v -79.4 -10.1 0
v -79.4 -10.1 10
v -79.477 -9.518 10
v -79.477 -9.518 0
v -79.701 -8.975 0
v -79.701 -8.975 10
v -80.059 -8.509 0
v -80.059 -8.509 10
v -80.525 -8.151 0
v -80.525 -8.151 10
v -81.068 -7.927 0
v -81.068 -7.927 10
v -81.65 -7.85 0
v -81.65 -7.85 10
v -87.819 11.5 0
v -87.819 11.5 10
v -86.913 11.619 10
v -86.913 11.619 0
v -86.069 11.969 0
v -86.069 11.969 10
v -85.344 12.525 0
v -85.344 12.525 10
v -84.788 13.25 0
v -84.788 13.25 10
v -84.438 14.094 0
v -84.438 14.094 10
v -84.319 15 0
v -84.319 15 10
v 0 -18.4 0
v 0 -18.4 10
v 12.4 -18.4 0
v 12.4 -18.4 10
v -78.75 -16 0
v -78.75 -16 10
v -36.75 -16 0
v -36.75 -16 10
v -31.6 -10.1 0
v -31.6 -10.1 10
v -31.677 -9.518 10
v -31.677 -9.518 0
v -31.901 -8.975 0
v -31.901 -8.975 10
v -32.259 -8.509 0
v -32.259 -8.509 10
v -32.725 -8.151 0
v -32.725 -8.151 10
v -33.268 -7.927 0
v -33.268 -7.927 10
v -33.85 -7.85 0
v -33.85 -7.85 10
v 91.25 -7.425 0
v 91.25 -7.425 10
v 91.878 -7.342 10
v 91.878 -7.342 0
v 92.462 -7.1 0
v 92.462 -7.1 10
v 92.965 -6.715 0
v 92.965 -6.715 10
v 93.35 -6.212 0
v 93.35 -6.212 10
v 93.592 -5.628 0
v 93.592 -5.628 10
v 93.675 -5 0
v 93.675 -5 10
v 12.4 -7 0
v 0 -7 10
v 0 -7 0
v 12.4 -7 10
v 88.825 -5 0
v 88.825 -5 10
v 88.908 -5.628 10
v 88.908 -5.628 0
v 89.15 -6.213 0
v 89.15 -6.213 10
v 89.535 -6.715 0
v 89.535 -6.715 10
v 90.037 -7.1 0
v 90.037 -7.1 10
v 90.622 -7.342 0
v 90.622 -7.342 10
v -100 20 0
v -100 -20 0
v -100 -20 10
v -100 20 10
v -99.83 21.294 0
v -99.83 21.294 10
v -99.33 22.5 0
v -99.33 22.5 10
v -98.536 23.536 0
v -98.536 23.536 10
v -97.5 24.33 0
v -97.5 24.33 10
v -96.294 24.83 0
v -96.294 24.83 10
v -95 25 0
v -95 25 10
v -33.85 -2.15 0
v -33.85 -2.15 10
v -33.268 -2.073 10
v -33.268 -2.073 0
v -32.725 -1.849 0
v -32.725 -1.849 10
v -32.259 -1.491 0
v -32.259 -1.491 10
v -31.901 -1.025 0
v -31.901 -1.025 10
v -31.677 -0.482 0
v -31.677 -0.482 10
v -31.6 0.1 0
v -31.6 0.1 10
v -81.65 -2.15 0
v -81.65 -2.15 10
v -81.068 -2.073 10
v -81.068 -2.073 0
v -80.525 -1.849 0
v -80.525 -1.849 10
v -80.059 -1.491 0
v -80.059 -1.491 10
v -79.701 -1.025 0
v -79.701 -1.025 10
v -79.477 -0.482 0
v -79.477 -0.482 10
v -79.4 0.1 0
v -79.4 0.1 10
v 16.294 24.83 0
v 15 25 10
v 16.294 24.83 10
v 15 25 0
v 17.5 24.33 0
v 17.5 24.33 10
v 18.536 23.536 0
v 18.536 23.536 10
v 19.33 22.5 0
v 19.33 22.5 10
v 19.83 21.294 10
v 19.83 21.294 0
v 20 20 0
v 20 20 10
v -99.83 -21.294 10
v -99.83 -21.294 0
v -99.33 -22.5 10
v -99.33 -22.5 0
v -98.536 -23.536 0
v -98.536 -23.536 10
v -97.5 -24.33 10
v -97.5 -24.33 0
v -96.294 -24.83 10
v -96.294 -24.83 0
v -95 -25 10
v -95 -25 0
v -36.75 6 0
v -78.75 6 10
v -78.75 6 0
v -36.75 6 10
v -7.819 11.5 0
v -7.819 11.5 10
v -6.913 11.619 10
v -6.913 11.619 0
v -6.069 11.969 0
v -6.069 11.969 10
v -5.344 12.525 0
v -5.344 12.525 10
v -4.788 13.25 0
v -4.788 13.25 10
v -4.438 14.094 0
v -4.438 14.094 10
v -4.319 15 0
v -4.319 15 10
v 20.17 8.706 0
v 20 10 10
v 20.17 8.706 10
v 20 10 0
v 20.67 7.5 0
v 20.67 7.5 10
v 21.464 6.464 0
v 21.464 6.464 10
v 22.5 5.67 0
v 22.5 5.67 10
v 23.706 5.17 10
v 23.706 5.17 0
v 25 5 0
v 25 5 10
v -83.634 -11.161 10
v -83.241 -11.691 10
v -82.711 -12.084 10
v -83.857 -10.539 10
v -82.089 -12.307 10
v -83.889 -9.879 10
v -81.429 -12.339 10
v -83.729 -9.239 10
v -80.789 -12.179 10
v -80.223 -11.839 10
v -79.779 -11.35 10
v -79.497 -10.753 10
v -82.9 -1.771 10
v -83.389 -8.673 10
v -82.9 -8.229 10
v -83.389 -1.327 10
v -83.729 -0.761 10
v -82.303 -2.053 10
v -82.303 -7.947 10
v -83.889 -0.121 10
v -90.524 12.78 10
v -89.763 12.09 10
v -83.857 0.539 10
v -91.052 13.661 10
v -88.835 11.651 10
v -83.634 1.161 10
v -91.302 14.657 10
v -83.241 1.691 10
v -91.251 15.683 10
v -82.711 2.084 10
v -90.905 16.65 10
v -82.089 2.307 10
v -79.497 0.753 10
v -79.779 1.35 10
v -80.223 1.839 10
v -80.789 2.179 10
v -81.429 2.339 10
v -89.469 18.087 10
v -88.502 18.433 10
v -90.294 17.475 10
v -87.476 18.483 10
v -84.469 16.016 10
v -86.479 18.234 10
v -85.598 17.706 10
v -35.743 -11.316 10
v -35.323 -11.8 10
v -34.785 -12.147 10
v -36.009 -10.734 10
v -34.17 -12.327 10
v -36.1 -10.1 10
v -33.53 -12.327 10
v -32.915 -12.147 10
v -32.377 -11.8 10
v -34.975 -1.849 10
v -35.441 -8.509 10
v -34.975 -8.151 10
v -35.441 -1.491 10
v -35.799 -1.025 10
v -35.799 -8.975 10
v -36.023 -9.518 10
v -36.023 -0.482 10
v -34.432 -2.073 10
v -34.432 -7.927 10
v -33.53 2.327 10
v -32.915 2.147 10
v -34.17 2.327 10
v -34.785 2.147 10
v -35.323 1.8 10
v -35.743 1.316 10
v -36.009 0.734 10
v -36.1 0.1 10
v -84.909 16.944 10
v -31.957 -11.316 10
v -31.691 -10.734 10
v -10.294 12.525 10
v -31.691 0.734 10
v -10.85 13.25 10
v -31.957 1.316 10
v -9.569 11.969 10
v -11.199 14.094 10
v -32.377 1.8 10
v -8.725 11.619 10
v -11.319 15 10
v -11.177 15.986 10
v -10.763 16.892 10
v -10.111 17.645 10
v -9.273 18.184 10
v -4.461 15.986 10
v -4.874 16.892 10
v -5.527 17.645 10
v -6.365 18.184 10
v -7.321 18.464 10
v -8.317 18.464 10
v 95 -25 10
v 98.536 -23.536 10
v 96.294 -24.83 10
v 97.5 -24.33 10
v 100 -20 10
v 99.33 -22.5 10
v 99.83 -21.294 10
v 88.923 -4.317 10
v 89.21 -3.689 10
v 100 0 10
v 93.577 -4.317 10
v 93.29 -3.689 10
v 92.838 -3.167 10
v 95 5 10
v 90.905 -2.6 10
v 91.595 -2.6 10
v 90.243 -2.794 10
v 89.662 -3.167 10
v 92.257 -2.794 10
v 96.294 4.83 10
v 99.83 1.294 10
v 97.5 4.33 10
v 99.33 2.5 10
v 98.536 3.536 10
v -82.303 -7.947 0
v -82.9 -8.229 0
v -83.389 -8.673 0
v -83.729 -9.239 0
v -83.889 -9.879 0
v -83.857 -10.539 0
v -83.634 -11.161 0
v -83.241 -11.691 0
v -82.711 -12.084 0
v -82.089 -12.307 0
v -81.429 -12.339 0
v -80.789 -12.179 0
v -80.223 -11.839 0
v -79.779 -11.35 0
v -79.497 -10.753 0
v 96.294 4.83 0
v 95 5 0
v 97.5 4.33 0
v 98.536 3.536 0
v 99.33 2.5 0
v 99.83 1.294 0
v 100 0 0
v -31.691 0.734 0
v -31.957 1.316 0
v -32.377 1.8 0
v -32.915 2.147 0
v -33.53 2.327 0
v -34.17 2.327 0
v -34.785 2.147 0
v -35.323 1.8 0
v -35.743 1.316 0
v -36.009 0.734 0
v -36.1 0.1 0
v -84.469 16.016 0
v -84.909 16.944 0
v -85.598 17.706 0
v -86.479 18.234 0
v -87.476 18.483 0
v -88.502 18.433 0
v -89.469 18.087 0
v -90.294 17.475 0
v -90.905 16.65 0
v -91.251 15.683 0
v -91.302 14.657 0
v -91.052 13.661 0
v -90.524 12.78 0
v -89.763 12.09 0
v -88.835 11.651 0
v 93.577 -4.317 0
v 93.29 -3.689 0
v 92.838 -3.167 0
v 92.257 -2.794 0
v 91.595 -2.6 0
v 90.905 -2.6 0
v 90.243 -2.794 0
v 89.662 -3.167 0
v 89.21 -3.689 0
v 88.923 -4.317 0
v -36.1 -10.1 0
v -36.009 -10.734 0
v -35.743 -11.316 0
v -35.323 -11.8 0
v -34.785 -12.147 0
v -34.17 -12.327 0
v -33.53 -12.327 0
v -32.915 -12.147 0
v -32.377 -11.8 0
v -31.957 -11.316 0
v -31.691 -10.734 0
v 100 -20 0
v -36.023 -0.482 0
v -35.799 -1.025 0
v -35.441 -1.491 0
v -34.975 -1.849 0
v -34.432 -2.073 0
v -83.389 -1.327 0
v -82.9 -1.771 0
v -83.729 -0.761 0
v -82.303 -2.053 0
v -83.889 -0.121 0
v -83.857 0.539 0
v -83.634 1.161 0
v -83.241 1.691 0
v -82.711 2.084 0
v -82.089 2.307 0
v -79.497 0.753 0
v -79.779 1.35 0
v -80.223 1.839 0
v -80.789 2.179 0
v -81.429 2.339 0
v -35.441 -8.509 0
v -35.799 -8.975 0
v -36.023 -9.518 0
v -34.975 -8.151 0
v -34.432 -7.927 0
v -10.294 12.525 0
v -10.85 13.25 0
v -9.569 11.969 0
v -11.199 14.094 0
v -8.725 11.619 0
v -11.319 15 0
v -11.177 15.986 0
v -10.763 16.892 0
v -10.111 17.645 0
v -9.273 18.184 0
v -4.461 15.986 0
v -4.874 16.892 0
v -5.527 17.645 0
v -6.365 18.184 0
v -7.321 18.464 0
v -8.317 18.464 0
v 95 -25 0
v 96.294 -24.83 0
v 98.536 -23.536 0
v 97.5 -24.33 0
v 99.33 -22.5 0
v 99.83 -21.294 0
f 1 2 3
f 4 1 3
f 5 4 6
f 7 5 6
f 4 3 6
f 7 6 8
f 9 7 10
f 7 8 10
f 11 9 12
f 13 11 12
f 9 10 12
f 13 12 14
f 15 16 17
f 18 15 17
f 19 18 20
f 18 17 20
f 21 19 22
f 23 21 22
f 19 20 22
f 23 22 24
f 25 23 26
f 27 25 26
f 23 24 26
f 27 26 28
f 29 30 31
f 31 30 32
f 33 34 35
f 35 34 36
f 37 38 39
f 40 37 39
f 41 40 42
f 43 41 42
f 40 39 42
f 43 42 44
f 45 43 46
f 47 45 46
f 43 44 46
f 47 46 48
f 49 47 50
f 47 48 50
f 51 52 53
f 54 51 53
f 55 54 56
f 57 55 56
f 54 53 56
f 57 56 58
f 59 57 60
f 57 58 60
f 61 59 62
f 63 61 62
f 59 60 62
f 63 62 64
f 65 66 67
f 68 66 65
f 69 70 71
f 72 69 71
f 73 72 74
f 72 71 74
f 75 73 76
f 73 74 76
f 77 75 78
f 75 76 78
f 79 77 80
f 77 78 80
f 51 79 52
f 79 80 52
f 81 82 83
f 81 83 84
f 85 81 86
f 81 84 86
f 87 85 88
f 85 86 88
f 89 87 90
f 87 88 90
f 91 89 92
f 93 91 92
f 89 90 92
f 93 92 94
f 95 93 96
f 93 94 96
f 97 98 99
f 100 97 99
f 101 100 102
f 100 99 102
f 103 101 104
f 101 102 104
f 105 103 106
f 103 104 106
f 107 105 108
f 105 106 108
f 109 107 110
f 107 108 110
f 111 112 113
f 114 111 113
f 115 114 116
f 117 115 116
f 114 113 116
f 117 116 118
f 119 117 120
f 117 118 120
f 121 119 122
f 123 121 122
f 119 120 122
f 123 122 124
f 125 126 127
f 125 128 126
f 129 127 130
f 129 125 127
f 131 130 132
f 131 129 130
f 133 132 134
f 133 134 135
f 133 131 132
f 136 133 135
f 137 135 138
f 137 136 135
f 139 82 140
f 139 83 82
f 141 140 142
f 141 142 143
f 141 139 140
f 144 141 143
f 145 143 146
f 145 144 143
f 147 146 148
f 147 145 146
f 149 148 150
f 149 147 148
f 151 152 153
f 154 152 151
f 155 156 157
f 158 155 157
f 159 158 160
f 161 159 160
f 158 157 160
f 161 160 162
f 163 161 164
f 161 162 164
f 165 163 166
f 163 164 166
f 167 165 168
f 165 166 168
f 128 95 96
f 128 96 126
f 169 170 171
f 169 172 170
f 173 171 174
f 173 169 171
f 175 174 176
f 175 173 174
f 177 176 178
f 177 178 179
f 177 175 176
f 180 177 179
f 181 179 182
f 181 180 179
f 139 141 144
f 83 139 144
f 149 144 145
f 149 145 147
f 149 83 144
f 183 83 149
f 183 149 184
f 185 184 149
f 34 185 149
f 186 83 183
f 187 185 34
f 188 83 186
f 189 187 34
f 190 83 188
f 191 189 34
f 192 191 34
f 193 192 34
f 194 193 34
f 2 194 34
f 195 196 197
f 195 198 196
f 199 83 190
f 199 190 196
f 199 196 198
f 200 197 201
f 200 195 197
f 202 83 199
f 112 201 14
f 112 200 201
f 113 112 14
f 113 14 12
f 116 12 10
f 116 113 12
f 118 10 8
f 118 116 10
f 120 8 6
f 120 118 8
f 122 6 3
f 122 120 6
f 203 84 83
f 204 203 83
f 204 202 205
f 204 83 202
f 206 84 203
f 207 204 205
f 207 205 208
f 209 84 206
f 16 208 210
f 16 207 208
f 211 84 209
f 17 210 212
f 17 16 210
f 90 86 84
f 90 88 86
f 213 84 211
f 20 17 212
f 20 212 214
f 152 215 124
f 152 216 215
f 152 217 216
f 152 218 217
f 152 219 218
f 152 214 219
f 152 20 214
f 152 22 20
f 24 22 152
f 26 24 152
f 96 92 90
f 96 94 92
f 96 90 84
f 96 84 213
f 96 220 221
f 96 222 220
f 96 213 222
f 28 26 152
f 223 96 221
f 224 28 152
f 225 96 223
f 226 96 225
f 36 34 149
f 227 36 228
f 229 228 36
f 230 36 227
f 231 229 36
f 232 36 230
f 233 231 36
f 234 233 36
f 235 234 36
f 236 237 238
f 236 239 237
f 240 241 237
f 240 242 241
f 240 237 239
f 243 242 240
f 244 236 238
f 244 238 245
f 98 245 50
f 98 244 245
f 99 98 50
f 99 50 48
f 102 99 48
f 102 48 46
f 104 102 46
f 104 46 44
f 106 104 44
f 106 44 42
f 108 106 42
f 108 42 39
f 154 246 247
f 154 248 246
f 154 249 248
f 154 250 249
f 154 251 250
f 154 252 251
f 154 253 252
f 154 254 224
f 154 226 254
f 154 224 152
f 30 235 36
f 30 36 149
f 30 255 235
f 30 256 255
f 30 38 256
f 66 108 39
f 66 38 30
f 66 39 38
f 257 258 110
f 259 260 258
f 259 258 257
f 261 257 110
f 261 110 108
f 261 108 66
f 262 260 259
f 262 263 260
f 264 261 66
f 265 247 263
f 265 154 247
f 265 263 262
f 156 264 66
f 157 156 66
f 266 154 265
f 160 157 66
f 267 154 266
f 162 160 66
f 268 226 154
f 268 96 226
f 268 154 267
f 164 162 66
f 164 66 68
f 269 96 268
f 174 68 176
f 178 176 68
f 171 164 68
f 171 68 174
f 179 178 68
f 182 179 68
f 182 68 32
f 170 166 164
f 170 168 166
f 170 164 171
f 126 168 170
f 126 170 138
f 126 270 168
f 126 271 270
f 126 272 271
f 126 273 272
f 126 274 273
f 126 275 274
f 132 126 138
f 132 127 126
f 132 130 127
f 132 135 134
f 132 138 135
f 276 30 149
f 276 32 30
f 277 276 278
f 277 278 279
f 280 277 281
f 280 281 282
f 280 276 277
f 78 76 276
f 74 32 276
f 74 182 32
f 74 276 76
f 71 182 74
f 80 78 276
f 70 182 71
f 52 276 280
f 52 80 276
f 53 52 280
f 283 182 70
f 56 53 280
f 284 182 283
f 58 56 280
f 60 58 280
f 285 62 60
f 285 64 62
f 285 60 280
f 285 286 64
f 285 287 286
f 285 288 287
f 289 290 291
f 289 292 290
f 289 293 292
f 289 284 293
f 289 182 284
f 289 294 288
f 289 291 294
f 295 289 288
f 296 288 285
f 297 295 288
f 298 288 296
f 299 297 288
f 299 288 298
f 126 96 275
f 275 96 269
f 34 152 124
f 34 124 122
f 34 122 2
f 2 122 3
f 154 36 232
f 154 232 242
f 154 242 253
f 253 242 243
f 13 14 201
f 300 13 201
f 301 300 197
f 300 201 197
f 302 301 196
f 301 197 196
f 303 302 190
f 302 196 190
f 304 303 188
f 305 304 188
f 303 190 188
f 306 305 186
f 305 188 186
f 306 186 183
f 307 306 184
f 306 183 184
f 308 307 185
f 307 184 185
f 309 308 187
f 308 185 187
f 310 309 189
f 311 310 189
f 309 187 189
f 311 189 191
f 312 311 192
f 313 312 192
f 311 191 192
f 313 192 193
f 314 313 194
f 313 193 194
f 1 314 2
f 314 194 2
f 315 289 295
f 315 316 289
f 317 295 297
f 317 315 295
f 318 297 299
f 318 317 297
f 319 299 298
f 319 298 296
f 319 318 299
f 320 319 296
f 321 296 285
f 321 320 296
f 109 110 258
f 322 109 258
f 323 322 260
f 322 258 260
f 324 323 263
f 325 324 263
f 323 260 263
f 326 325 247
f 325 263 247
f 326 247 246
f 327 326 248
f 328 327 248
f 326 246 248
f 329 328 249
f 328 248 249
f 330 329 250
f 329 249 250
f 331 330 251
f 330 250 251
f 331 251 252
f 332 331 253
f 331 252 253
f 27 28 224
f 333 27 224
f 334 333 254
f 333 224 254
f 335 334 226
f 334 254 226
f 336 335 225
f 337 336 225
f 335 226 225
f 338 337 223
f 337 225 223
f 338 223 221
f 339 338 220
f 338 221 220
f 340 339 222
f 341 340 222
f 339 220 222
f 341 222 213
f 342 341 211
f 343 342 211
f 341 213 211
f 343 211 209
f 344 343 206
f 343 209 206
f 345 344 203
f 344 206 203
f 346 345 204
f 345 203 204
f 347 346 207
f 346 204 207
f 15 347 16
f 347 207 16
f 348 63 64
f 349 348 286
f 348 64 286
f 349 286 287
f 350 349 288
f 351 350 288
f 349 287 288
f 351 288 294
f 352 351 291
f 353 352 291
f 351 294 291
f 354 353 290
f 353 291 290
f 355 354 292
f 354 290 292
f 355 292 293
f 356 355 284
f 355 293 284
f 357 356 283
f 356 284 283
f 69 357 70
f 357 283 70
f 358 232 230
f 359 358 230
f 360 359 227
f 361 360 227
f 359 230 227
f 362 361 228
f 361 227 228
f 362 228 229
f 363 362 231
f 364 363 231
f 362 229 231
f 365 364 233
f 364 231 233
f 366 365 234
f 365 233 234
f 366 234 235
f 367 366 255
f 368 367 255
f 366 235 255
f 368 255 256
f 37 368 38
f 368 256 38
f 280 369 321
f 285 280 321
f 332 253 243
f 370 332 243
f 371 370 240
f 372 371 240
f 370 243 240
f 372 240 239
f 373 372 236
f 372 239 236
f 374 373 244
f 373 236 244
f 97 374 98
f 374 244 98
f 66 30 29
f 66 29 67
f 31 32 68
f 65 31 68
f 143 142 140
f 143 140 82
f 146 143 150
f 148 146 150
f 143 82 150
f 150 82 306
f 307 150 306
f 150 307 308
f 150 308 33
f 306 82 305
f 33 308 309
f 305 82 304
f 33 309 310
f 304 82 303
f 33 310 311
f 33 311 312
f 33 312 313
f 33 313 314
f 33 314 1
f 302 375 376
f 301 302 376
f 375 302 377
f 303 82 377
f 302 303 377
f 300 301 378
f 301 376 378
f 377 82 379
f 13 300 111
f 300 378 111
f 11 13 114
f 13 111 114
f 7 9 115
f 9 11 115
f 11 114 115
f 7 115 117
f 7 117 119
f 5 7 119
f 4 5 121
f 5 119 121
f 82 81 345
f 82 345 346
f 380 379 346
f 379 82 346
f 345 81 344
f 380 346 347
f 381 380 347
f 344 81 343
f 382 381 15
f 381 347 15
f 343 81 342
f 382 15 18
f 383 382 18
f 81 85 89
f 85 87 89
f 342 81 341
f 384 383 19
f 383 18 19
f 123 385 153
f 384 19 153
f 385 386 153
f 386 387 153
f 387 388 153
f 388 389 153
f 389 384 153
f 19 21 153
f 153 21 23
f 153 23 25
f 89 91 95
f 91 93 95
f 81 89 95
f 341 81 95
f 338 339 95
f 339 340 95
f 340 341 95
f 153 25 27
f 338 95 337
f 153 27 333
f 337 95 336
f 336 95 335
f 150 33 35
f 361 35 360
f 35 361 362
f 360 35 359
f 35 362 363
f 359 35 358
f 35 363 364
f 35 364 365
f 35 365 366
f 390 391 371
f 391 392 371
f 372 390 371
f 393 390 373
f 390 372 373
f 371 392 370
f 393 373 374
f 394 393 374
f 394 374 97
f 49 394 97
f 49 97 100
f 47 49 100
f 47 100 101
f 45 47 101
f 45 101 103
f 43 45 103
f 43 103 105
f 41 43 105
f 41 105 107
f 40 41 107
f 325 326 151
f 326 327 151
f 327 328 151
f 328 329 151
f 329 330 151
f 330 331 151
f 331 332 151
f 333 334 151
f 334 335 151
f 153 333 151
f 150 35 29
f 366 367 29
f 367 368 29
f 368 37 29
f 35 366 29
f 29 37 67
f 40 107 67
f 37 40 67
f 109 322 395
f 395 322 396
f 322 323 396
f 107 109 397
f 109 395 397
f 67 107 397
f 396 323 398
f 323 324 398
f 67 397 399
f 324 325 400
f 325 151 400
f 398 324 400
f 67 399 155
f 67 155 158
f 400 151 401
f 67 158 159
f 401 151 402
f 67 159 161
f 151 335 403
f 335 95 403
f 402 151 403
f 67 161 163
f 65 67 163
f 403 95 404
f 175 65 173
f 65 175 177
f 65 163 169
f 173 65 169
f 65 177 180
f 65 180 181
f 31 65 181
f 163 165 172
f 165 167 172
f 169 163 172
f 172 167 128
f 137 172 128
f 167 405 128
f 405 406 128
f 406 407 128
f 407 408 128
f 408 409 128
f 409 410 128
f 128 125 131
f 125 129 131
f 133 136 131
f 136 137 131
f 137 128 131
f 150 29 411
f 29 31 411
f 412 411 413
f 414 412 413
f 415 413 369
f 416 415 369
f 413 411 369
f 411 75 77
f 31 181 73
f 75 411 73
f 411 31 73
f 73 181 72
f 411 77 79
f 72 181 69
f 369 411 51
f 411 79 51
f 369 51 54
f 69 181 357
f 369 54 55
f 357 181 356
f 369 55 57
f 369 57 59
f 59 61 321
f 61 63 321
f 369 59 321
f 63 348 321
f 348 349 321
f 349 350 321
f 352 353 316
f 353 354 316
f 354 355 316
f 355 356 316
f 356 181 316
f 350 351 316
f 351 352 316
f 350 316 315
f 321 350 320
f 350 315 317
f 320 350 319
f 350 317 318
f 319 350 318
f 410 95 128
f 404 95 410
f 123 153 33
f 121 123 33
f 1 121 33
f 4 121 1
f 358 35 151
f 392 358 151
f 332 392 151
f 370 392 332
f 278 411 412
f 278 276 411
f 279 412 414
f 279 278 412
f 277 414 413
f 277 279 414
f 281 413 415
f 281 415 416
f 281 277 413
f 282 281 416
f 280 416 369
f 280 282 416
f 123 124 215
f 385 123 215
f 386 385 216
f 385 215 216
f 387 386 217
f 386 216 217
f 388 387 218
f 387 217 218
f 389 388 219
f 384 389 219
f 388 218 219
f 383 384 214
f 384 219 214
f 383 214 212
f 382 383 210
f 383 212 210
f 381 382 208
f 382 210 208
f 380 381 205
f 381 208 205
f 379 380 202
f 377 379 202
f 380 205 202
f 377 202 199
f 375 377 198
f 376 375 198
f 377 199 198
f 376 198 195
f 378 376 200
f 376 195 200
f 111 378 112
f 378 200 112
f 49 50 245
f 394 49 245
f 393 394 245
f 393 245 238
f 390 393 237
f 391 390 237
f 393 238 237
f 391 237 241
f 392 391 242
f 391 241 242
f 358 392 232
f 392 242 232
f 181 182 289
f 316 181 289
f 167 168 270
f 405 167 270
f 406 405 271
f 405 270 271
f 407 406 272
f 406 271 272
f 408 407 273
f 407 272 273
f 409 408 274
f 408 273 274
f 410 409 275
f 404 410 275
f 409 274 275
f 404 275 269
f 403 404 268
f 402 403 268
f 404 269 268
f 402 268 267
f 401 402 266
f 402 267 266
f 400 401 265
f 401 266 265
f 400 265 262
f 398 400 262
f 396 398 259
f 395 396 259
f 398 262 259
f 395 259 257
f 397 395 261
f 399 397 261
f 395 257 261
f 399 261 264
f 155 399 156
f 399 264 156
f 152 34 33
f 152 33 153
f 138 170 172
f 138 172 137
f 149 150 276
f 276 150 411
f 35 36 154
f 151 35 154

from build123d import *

# Parameters (mm, degrees)
F0_W      = 200
F0_H      = 50
F1_DEPTH  = 10
F2_W      = 42
F2_H      = 22
F3_DEPTH  = 10.001
F5_DEPTH  = 10.001
F7_DEPTH  = 10.001
F8_R      = 5
F11_W     = 80
F11_H     = 20
F9_W      = 12.4
F9_H      = 11.4
F12_DEPTH = 10.001
F13_R     = 5


with BuildPart() as f1:
    # F0 (on Top) → F1 (new body)
    with BuildSketch(Plane.XY):
        Rectangle(F0_W, F0_H)
    extrude(amount=F1_DEPTH)

    # F2 (on face) → F3 (cut, through all)
    with BuildSketch(Plane.XY.offset(10)):
        with Locations((-57.7500068545, -5)):
            Rectangle(F2_W, F2_H)
    extrude(amount=-F3_DEPTH, mode=Mode.SUBTRACT)

    # F4 (on face) → F5 (cut, through all)
    with BuildSketch(Plane.XY.offset(10)):
        with BuildLine():
            Line((-81.6500068545, -2.15), (-81.6500068545, 0.1))
            Line((-81.6500068545, 0.1), (-79.4000068545, 0.1))
            ThreePointArc((-79.4000068545, 0.1), (-83.2409971122, 1.6909902577), (-81.6500068545, -2.15))
        make_face()
        with BuildLine():
            Line((-79.4000068545, 0.1), (-81.6500068545, 0.1))
            Line((-81.6500068545, 0.1), (-81.6500068545, -2.15))
            ThreePointArc((-81.6500068545, -2.15), (-80.0590165969, -1.4909902577), (-79.4000068545, 0.1))
        make_face()
        with BuildLine():
            Line((-81.6500068545, -10.1), (-81.6500068545, -7.85))
            ThreePointArc((-81.6500068545, -7.85), (-83.2409971122, -11.6909902577), (-79.4000068545, -10.1))
            Line((-79.4000068545, -10.1), (-81.6500068545, -10.1))
        make_face()
        with BuildLine():
            ThreePointArc((-79.4000068545, -10.1), (-80.0590165969, -8.5090097423), (-81.6500068545, -7.85))
            Line((-81.6500068545, -7.85), (-81.6500068545, -10.1))
            Line((-81.6500068545, -10.1), (-79.4000068545, -10.1))
        make_face()
        with BuildLine():
            Line((-33.8500068545, 0.1), (-36.1000068545, 0.1))
            ThreePointArc((-36.1000068545, 0.1), (-35.4409971122, -1.4909902577), (-33.8500068545, -2.15))
            Line((-33.8500068545, -2.15), (-33.8500068545, 0.1))
        make_face()
        with BuildLine():
            ThreePointArc((-31.6000068545, 0.1), (-33.8500068545, 2.35), (-36.1000068545, 0.1))
            Line((-36.1000068545, 0.1), (-33.8500068545, 0.1))
            Line((-33.8500068545, 0.1), (-33.8500068545, -2.15))
            ThreePointArc((-33.8500068545, -2.15), (-32.2590165969, -1.4909902577), (-31.6000068545, 0.1))
        make_face()
        with BuildLine():
            ThreePointArc((-33.8500068545, -7.85), (-35.4409971122, -8.5090097423), (-36.1000068545, -10.1))
            Line((-36.1000068545, -10.1), (-33.8500068545, -10.1))
            Line((-33.8500068545, -10.1), (-33.8500068545, -7.85))
        make_face()
        with BuildLine():
            Line((-33.8500068545, -10.1), (-36.1000068545, -10.1))
            ThreePointArc((-36.1000068545, -10.1), (-33.8500068545, -12.35), (-31.6000068545, -10.1))
            ThreePointArc((-31.6000068545, -10.1), (-32.2590165969, -8.5090097423), (-33.8500068545, -7.85))
            Line((-33.8500068545, -7.85), (-33.8500068545, -10.1))
        make_face()
    extrude(amount=-F5_DEPTH, mode=Mode.SUBTRACT)

    # F6 (on face) → F7 (cut, through all)
    with BuildSketch(Plane.XY.offset(10)):
        with BuildLine():
            Line((-87.8187507391, 11.5), (-87.8187507391, 15))
            Line((-87.8187507391, 15), (-84.3187507391, 15))
            ThreePointArc((-84.3187507391, 15), (-90.2936244733, 17.4748737342), (-87.8187507391, 11.5))
        make_face()
        with BuildLine():
            Line((-84.3187507391, 15), (-87.8187507391, 15))
            Line((-87.8187507391, 15), (-87.8187507391, 11.5))
            ThreePointArc((-87.8187507391, 11.5), (-85.3438770049, 12.5251262658), (-84.3187507391, 15))
        make_face()
        with BuildLine():
            Line((-7.8187507391, 15), (-11.3187507391, 15))
            ThreePointArc((-11.3187507391, 15), (-10.2936244733, 12.5251262658), (-7.8187507391, 11.5))
            Line((-7.8187507391, 11.5), (-7.8187507391, 15))
        make_face()
        with BuildLine():
            ThreePointArc((-4.3187507391, 15), (-7.8187507391, 18.5), (-11.3187507391, 15))
            Line((-11.3187507391, 15), (-7.8187507391, 15))
            Line((-7.8187507391, 15), (-7.8187507391, 11.5))
            ThreePointArc((-7.8187507391, 11.5), (-5.3438770049, 12.5251262658), (-4.3187507391, 15))
        make_face()
    extrude(amount=-F7_DEPTH, mode=Mode.SUBTRACT)

    # F8
    f8_edges = [f1.edges().sort_by_distance(p)[0] for p in [
        (-100, 25, 5),
        (-100, -25, 5),
        (100, 25, 5),
        (100, -25, 5),
    ]]
    fillet(f8_edges, radius=F8_R)

    # F11 (on face) + F10 (on face) + F9 (on face) → F12 (cut, through all)
    with BuildSketch(Plane.XY.offset(10)):
        with Locations((60, 15)):
            Rectangle(F11_W, F11_H)
    with BuildSketch(Plane.XY.offset(10)):
        with BuildLine():
            ThreePointArc((93.6749931455, -5), (91.2499931455, -2.575), (88.8249931455, -5))
            Line((88.8249931455, -5), (91.2499931455, -5))
            Line((91.2499931455, -5), (91.2499931455, -7.425))
            ThreePointArc((91.2499931455, -7.425), (92.9647270898, -6.7147339444), (93.6749931455, -5))
        make_face()
        with BuildLine():
            Line((91.2499931455, -5), (88.8249931455, -5))
            ThreePointArc((88.8249931455, -5), (89.5352592011, -6.7147339444), (91.2499931455, -7.425))
            Line((91.2499931455, -7.425), (91.2499931455, -5))
        make_face()
    with BuildSketch(Plane.XY.offset(10)):
        with Locations((6.2, -12.7)):
            Rectangle(F9_W, F9_H)
    extrude(amount=-F12_DEPTH, mode=Mode.SUBTRACT)

    # F13
    f13_edges = [f1.edges().sort_by_distance(p)[0] for p in [
        (20, 25, 5),
        (20, 5, 5),
        (100, 5, 5),
    ]]
    fillet(f13_edges, radius=F13_R)


solid = f1.part
